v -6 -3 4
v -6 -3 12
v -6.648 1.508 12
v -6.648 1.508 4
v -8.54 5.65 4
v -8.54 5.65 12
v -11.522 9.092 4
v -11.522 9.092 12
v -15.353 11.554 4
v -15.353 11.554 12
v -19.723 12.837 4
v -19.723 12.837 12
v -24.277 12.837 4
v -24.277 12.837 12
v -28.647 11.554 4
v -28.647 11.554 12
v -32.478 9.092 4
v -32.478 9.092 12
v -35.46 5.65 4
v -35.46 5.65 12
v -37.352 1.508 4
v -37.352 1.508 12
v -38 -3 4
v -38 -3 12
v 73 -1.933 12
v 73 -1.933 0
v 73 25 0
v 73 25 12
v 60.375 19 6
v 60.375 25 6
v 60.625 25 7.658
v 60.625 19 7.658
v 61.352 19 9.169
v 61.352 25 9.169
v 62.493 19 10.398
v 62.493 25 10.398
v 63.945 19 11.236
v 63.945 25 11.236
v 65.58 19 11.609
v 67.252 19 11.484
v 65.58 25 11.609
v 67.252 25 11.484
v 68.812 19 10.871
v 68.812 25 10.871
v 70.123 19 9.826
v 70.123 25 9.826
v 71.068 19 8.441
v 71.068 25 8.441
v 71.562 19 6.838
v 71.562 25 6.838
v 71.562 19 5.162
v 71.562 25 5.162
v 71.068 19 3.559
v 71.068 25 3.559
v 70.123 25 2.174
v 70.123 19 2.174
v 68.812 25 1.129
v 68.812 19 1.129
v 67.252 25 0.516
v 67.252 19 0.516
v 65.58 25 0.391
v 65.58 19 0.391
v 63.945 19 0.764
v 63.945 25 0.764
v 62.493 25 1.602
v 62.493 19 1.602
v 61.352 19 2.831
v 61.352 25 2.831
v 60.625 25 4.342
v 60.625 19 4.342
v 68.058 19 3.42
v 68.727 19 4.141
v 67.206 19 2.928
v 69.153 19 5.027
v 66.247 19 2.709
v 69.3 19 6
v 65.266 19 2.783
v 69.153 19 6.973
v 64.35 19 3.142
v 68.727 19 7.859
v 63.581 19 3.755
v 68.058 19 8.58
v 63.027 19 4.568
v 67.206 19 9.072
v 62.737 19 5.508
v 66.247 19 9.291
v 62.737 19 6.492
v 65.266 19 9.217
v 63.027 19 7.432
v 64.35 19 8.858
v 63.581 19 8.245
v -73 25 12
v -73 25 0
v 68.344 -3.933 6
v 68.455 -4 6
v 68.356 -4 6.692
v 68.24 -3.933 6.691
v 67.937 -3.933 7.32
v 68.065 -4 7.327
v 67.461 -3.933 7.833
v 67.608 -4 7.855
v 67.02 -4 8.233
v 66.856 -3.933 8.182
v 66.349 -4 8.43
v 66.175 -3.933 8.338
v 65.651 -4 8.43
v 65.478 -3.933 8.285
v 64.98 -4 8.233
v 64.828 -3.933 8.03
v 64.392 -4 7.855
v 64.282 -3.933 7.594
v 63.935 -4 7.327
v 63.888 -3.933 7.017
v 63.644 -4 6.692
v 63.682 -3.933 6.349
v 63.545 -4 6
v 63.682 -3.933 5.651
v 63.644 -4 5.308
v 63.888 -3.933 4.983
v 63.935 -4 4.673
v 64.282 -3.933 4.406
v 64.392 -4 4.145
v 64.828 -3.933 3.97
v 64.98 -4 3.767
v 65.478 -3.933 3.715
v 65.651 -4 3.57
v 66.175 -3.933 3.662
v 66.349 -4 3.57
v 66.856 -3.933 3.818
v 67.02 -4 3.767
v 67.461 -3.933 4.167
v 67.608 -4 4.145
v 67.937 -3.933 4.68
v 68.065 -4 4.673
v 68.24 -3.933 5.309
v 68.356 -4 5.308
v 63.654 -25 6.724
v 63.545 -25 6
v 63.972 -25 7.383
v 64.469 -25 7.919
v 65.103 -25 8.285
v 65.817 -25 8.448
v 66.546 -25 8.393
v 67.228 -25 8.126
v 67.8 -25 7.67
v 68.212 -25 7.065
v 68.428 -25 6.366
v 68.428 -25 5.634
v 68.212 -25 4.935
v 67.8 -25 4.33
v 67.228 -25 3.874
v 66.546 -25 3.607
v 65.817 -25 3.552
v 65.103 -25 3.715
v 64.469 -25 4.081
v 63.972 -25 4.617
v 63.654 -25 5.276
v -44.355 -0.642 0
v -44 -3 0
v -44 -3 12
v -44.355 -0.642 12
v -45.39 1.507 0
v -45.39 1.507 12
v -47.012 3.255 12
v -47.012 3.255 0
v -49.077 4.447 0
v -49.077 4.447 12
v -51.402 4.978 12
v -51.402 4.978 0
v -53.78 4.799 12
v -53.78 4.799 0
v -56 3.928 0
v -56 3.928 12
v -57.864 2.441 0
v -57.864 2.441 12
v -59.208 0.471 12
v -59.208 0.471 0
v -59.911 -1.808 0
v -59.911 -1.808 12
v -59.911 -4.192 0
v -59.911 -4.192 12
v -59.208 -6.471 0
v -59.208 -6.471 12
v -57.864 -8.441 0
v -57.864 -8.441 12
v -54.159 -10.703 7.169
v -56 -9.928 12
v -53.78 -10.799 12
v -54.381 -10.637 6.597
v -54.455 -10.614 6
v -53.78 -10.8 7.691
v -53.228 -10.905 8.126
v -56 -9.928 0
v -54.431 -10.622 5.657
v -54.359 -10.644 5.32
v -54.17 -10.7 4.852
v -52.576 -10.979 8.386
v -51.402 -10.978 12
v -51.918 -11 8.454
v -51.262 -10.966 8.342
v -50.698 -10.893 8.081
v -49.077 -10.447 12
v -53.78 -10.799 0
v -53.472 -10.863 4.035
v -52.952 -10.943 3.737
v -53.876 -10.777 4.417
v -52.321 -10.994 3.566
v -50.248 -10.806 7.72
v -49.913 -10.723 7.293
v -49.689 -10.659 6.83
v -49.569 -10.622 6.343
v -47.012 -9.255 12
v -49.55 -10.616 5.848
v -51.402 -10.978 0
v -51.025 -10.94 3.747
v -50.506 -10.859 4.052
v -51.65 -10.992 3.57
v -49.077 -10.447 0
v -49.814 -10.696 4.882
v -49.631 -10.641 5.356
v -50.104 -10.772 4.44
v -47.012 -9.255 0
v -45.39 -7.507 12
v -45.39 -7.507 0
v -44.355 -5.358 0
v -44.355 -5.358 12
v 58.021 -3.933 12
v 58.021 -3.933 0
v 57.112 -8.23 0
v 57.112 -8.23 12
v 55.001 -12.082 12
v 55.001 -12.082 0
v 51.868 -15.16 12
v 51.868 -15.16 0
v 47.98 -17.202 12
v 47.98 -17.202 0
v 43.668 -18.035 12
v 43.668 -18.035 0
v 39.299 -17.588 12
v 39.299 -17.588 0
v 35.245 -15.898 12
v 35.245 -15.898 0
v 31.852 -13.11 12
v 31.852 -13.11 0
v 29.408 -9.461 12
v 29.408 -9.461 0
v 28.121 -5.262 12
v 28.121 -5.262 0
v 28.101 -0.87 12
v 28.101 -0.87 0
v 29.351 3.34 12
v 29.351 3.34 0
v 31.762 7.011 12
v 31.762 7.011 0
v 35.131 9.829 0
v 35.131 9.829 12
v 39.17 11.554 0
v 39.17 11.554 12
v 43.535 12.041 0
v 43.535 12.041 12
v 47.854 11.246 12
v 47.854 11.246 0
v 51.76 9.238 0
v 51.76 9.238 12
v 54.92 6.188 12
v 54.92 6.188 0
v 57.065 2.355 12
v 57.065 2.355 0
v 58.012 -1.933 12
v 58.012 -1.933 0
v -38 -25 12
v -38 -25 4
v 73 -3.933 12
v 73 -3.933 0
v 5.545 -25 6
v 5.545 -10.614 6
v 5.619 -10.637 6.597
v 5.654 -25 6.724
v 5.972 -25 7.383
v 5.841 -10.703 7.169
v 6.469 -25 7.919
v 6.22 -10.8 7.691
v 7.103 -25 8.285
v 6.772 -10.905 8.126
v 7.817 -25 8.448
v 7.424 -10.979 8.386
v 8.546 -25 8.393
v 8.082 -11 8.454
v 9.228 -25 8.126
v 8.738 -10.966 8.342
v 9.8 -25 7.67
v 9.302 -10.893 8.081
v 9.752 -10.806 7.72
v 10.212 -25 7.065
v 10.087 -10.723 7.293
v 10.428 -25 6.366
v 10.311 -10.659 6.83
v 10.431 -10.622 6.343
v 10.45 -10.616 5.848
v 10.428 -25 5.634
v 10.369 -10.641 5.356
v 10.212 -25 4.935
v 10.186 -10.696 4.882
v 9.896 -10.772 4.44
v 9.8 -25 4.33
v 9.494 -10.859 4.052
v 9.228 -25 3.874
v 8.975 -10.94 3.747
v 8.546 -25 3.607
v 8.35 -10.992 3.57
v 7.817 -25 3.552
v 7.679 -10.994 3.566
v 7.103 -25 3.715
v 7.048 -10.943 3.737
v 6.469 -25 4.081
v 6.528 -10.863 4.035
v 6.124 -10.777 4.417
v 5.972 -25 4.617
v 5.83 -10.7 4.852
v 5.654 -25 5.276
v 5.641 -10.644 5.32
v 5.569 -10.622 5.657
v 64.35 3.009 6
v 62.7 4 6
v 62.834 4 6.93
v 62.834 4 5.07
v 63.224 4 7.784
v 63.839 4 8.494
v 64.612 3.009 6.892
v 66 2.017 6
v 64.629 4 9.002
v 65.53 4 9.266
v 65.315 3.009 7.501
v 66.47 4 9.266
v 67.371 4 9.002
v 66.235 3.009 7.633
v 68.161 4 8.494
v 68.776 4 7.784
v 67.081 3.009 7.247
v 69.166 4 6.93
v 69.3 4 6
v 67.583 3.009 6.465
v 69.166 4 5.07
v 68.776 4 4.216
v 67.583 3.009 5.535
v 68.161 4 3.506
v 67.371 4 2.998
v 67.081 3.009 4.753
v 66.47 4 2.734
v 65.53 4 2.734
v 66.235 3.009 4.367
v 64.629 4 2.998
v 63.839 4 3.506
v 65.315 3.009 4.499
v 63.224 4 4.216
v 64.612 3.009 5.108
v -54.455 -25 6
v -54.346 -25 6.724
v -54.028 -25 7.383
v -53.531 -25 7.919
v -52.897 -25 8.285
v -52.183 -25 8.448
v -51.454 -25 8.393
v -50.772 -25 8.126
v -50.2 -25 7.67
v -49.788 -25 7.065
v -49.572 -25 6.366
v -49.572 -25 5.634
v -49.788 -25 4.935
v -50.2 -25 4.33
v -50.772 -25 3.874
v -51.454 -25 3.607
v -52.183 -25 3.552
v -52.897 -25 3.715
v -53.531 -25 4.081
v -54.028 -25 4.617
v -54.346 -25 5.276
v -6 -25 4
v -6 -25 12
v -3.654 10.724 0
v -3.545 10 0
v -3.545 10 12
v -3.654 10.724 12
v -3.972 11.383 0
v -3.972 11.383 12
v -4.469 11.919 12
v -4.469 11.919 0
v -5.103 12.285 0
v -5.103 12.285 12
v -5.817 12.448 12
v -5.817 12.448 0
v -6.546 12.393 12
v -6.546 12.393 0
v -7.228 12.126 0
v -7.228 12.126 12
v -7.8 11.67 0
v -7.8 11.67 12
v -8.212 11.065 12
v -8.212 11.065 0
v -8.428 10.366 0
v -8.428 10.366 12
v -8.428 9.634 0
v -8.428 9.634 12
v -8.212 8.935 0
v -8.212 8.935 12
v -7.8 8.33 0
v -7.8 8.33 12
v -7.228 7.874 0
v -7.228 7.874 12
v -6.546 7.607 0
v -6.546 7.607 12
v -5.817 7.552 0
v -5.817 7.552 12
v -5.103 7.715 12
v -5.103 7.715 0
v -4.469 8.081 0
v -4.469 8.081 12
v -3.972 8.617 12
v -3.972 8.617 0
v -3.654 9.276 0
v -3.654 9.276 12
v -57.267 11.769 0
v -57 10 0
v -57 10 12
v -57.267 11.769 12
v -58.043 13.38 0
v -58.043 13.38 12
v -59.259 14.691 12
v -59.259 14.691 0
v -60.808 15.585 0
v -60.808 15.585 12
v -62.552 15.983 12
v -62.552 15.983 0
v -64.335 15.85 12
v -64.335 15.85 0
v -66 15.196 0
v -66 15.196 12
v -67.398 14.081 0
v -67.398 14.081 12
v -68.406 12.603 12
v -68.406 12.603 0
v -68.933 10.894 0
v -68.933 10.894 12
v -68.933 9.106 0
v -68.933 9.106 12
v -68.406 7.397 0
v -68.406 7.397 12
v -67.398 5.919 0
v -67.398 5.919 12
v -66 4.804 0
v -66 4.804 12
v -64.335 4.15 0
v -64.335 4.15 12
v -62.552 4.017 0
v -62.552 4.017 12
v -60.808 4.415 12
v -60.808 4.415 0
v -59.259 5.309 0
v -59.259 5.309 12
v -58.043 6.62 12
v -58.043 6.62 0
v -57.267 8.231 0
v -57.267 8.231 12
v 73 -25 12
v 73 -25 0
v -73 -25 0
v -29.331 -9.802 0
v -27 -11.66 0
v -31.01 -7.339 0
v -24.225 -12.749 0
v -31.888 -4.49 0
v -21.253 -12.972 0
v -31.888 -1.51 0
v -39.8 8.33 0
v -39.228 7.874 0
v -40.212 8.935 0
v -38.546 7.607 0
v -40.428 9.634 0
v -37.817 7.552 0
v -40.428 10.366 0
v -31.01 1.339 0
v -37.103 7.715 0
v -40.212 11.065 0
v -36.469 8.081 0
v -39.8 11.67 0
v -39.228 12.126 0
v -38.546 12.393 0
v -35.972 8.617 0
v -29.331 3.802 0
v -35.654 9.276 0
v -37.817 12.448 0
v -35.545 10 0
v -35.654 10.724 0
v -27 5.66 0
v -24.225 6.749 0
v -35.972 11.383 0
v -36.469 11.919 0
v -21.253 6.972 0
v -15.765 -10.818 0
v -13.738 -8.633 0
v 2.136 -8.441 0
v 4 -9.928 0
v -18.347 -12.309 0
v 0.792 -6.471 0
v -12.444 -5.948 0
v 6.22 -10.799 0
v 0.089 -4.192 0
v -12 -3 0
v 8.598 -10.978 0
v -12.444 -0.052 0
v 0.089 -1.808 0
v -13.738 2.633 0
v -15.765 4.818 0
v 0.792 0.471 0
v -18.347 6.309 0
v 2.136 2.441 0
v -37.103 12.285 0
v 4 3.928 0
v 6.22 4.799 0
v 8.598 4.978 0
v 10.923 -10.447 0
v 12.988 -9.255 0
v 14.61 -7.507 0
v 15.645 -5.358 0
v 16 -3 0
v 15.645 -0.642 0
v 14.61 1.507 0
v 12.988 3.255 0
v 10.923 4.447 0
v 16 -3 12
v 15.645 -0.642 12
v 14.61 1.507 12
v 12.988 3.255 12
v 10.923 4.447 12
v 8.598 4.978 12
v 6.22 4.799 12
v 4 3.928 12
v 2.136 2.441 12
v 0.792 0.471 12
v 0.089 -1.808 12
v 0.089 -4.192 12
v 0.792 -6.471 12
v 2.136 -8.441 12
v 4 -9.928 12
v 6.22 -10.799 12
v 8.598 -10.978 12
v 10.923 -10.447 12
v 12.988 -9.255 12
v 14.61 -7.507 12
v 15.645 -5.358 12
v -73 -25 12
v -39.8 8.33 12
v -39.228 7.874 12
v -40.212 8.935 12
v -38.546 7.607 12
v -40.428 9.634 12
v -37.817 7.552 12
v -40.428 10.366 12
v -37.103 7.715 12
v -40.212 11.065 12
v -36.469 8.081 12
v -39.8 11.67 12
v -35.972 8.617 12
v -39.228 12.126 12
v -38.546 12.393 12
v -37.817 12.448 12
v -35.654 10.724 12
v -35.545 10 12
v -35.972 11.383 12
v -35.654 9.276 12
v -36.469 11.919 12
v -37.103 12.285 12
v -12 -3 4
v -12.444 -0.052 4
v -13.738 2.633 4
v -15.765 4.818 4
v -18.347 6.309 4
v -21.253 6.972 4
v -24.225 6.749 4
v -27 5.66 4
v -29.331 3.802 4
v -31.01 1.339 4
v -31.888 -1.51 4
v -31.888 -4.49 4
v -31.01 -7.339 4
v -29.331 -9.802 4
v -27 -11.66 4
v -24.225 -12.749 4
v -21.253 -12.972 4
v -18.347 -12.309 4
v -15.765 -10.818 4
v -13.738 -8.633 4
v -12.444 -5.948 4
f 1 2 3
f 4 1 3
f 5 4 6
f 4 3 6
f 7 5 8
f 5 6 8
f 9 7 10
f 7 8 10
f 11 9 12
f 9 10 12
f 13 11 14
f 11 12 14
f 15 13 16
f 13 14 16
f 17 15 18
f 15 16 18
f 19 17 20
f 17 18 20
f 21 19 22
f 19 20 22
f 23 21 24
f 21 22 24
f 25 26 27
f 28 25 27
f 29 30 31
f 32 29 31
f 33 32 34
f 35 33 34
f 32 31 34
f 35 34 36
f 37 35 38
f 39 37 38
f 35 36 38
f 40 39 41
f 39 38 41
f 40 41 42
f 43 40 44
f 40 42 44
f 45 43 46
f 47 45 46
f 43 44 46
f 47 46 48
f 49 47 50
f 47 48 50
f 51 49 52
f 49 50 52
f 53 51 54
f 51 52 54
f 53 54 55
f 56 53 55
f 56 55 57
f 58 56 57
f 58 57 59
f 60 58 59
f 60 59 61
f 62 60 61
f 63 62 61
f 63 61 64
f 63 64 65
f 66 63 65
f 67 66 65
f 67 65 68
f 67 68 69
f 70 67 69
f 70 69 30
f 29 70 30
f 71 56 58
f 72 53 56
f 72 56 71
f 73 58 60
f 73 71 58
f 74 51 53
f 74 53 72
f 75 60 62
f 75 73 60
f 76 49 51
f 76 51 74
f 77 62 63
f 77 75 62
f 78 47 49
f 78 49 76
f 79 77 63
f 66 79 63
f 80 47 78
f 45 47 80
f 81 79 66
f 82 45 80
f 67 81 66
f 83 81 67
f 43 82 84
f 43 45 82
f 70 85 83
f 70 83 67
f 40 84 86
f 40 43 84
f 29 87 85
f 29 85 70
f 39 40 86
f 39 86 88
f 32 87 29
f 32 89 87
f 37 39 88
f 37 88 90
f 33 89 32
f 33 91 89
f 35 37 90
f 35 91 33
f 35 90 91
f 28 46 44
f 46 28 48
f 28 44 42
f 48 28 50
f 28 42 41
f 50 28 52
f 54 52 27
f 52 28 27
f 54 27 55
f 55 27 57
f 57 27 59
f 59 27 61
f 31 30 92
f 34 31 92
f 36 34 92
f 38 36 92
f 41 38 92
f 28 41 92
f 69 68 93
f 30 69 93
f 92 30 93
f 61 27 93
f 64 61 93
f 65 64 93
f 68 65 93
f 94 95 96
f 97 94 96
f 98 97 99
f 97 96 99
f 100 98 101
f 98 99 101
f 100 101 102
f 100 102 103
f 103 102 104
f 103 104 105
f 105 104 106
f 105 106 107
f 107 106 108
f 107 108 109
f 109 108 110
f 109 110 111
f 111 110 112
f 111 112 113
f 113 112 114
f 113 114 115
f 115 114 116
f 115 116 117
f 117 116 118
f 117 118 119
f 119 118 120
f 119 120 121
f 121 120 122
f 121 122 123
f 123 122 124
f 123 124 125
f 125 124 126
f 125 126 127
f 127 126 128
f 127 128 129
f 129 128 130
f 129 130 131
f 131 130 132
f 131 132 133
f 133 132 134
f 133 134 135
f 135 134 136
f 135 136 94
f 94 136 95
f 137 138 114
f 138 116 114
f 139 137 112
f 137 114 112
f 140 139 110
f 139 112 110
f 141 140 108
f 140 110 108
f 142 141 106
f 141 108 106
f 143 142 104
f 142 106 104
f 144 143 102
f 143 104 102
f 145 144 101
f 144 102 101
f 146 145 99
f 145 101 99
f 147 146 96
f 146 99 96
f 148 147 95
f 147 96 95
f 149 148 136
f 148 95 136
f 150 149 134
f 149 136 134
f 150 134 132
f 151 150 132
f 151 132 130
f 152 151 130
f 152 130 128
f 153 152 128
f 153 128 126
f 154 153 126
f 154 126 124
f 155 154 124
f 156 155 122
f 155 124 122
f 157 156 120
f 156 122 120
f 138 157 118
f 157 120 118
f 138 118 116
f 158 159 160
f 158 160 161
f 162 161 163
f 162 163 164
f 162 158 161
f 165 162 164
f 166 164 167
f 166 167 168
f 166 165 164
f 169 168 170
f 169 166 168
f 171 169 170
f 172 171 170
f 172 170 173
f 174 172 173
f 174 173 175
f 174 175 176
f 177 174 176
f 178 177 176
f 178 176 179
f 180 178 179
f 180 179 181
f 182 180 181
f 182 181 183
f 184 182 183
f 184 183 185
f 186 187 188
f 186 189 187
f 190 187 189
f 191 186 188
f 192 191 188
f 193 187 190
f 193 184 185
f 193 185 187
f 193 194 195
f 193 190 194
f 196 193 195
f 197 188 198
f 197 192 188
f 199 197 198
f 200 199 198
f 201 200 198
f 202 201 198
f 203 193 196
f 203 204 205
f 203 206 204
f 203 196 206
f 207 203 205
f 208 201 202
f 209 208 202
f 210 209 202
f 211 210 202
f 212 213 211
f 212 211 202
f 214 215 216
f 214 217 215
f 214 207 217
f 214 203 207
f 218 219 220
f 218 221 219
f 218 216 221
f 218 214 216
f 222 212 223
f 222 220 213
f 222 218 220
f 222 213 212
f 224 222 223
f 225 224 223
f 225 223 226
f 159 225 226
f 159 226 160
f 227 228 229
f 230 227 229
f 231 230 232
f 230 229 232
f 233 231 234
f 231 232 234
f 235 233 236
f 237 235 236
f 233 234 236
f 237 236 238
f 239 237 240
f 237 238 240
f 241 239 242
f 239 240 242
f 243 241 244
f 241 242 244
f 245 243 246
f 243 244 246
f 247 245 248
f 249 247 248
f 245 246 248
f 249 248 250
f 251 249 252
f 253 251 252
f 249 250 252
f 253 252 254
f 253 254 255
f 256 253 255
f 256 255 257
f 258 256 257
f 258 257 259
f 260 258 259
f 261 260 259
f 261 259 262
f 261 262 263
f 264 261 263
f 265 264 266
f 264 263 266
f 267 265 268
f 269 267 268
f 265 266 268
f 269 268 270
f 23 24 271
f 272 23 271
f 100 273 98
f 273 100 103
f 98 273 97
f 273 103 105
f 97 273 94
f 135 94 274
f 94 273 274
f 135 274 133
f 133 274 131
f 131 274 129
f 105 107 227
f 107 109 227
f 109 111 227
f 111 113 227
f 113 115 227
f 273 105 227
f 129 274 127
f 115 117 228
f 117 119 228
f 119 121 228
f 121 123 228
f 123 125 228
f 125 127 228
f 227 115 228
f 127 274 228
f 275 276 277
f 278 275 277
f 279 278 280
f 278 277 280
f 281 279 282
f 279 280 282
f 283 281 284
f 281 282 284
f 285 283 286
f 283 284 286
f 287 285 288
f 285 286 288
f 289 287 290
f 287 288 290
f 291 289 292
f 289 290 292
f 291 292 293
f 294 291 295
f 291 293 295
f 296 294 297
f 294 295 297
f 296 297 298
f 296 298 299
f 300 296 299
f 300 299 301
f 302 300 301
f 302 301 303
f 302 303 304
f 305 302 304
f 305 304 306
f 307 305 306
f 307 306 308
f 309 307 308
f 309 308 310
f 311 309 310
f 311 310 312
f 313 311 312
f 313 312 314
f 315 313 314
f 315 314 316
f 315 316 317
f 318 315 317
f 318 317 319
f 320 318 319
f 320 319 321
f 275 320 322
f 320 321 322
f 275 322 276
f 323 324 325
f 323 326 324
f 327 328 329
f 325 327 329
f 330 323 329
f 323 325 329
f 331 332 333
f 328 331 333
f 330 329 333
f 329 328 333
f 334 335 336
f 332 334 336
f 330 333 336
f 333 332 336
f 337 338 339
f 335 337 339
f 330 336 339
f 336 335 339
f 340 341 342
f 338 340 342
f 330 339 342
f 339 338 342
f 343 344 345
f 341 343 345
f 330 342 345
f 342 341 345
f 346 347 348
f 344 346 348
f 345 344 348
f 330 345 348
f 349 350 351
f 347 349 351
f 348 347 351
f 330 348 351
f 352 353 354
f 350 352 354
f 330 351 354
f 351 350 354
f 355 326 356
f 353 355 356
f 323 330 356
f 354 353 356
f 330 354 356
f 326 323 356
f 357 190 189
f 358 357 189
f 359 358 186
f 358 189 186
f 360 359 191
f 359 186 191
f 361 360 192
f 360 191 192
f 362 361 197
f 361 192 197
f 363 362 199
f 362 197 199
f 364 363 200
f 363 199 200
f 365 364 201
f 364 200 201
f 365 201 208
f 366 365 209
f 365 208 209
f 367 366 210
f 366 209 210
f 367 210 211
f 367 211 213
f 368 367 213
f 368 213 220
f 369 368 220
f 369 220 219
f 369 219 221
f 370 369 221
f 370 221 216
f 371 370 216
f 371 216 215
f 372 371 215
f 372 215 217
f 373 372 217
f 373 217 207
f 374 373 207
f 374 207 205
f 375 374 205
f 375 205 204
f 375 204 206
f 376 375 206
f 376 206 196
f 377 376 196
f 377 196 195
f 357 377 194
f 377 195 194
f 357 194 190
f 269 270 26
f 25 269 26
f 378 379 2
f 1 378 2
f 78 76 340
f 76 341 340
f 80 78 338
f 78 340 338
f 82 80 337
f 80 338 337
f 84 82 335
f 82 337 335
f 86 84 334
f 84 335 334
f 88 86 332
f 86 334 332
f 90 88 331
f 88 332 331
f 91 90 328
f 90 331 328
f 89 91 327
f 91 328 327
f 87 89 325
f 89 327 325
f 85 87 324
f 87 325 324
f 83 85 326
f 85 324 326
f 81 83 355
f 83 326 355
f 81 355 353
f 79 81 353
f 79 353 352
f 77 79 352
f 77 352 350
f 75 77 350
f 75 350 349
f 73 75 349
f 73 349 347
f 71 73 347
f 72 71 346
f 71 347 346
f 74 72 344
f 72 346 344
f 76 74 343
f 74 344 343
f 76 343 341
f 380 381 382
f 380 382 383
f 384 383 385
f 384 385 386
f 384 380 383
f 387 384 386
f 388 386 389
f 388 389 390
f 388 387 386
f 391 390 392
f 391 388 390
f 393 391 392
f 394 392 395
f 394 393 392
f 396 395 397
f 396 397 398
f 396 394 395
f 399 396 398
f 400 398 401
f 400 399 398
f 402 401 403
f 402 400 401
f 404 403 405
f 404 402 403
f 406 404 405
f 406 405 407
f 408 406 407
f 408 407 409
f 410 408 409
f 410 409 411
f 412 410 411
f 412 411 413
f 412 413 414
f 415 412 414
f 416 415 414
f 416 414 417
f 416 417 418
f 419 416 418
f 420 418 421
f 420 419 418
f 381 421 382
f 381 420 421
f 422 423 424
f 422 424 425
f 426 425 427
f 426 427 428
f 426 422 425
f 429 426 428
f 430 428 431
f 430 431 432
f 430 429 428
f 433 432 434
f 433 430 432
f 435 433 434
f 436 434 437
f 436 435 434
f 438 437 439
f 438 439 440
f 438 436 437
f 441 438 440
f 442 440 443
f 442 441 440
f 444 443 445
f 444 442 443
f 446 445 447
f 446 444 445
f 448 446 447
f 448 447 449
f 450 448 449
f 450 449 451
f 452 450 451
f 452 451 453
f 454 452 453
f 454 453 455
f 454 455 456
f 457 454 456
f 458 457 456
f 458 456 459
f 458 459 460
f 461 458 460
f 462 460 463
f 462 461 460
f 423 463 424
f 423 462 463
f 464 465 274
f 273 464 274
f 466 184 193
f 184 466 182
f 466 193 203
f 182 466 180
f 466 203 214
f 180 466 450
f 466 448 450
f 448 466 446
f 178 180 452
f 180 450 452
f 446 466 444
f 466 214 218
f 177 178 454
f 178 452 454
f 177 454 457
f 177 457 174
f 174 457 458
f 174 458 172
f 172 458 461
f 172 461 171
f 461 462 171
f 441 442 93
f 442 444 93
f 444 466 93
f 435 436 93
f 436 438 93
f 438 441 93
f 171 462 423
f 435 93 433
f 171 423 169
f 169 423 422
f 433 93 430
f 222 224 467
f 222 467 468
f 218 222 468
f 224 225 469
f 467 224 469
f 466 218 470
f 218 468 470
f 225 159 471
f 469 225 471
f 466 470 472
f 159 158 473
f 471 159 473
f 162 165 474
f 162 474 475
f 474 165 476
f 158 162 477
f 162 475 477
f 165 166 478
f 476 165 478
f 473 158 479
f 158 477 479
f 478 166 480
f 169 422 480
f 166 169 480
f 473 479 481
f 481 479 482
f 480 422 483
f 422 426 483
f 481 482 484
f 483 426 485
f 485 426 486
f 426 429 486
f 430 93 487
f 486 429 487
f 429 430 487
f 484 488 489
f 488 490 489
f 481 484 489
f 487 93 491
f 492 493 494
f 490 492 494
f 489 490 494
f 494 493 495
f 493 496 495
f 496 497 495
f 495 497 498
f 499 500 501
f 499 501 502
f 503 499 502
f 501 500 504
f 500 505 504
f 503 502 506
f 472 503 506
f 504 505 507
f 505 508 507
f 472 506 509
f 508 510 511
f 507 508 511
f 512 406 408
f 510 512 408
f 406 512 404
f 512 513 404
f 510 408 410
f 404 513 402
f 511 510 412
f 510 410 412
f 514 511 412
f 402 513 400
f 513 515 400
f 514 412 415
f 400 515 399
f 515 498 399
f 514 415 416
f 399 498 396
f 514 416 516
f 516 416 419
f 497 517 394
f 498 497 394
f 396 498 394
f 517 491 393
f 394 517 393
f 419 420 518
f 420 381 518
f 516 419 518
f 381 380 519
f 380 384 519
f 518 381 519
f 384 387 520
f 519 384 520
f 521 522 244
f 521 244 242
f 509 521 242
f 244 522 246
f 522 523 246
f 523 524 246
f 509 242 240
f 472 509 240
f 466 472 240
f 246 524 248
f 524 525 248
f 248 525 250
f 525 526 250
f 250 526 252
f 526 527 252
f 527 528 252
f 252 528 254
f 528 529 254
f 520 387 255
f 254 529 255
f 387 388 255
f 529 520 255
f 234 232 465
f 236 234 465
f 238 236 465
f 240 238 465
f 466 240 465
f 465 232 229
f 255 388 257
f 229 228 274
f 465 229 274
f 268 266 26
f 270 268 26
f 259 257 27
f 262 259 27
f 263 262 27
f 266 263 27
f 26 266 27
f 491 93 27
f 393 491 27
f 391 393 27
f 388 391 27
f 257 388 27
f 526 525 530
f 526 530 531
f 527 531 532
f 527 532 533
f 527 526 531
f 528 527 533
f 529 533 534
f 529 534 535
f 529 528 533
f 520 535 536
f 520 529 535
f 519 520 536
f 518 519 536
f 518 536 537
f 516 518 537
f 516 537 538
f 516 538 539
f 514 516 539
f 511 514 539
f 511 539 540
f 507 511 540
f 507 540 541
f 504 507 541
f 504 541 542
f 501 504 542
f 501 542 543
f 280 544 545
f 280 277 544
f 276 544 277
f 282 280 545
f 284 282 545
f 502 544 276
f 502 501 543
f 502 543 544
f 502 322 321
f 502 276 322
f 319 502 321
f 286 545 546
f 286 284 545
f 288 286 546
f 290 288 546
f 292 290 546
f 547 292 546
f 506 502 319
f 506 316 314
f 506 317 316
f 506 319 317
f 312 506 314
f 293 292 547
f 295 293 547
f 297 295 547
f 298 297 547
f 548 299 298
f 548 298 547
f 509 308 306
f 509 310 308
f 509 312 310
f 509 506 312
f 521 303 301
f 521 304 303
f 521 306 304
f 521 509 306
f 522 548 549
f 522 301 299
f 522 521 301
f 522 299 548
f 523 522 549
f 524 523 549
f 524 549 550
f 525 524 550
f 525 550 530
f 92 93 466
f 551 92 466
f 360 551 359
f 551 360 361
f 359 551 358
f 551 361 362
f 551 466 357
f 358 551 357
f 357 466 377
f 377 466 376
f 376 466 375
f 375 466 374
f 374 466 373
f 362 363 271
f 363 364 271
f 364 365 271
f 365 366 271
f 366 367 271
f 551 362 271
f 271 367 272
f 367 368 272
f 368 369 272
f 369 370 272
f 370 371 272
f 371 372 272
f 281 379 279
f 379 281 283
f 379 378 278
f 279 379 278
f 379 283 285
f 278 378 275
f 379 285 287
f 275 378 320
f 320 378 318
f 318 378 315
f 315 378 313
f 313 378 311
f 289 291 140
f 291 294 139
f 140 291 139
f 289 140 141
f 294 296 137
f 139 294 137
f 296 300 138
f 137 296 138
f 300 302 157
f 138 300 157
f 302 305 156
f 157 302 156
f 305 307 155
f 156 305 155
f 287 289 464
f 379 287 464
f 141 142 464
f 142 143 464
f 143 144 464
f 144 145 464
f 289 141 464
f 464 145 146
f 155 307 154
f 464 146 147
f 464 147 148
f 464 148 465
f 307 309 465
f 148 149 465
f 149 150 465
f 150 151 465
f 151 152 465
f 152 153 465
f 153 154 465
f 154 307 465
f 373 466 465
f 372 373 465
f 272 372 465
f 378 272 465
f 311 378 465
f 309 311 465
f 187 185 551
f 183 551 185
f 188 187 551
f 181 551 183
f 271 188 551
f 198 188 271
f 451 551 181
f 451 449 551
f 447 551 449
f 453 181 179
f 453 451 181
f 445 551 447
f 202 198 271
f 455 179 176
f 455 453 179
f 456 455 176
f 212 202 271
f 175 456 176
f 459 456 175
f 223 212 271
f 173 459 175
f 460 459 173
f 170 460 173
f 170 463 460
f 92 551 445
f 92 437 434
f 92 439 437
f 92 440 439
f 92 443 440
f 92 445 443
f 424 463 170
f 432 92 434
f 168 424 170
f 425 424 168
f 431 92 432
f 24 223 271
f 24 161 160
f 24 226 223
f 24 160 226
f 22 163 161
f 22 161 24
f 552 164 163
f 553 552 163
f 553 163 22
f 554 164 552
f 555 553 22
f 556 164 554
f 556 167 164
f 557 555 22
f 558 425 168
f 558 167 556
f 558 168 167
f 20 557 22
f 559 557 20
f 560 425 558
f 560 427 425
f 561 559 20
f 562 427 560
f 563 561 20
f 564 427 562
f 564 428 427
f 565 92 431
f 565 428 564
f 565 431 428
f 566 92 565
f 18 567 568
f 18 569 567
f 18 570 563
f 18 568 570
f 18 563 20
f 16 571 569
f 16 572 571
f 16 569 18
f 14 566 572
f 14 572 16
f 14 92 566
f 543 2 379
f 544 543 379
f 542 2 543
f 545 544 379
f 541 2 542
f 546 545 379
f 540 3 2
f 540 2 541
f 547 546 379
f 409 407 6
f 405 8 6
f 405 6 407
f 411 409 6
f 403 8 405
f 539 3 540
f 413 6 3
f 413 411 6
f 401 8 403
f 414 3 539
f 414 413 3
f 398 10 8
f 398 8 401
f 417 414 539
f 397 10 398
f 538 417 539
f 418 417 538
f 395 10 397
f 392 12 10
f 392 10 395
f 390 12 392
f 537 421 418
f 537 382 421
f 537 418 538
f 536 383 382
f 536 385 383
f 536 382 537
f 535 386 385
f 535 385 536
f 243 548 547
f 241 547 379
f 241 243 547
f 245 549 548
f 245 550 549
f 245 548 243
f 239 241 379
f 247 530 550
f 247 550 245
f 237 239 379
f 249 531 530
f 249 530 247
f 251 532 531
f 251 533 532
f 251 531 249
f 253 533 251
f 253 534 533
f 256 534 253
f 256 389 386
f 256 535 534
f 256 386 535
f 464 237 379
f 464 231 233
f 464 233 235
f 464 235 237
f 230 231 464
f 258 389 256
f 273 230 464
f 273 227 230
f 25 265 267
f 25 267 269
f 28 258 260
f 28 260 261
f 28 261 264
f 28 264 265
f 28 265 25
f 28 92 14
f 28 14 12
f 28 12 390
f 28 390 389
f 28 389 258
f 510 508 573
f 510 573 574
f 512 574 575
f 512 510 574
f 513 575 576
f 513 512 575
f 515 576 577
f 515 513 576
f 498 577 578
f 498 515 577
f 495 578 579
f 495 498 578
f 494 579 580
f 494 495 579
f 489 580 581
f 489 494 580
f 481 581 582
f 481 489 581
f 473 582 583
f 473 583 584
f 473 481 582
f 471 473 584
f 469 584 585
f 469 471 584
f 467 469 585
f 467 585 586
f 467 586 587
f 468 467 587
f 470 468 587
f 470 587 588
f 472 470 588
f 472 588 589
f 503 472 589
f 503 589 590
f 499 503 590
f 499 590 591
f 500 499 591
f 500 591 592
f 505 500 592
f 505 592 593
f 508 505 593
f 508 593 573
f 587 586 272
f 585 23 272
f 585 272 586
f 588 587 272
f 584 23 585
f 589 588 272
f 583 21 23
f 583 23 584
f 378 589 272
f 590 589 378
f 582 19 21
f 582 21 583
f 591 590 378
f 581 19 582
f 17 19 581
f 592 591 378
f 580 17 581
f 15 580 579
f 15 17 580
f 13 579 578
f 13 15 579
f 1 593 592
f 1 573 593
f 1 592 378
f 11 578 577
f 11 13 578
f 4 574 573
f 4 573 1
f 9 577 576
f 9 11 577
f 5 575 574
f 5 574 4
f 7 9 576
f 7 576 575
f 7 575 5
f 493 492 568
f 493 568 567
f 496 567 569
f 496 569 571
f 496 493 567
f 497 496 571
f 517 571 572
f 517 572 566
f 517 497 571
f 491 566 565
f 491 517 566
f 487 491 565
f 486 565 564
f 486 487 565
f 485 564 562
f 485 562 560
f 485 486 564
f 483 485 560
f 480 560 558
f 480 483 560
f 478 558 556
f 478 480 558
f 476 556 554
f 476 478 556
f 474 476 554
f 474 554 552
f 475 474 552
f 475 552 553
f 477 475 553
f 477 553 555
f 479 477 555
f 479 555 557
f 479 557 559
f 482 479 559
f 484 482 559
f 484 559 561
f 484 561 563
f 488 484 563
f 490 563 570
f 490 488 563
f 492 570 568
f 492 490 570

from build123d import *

# Parameters (mm, degrees)
F0_R           = 8
F0_R_2         = 10
F0_R_3         = 6
F0_R_4         = 2.455
F1_DEPTH       = 12
F2_R           = 10
F3_DEPTH       = 8
F5_D           = 4.91
F5_DEPTH       = 20
F5_TIP         = 1.4751128197
F6_D           = 4.91
F6_DEPTH       = 21
F6_TIP         = 1.4751128197
F8_D           = 6.6
F8_DEPTH       = 21
F8_CBORE_D     = 11.25
F8_CBORE_DEPTH = 6
F8_TIP         = 1.9828400428


with BuildPart() as f1:
    # F0 (on Top) → F1 (new body)
    with BuildSketch(Plane.XY):
        with BuildLine():
            Line((-73, -25), (73, -25))
            Line((73, -25), (73, -3.9333401471))
            Line((73, -3.9333401471), (58.0210311287, -3.9333401471))
            ThreePointArc((58.0210311287, -3.9333401471), (27.9501482812, -3.0668074952), (58.0121529688, -1.9333401471))
            Line((58.0121529688, -1.9333401471), (73, -1.9333401471))
            Line((73, -1.9333401471), (73, 25))
            Line((73, 25), (-73, 25))
            Line((-73, 25), (-73, -25))
        make_face()
        with Locations((-52, -3)):
            Circle(F0_R, mode=Mode.SUBTRACT)
        with Locations((-22, -3)):
            Circle(F0_R_2, mode=Mode.SUBTRACT)
        with Locations((8, -3)):
            Circle(F0_R, mode=Mode.SUBTRACT)
        with Locations((-63, 10)):
            Circle(F0_R_3, mode=Mode.SUBTRACT)
        with Locations((-38, 10)):
            Circle(F0_R_4, mode=Mode.SUBTRACT)
        with Locations((-6, 10)):
            Circle(F0_R_4, mode=Mode.SUBTRACT)
    extrude(amount=F1_DEPTH)

    # F2 (on face) → F3 (cut)
    with BuildSketch(Plane.XY.offset(12)):
        with BuildLine():
            Line((-6, -25), (-6, -3))
            ThreePointArc((-6, -3), (-22, 13), (-38, -3))
            Line((-38, -3), (-38, -25))
            Line((-38, -25), (-6, -25))
        make_face()
        with Locations((-22, -3)):
            Circle(F2_R, mode=Mode.SUBTRACT)
    extrude(amount=-F3_DEPTH, mode=Mode.SUBTRACT)

    # F5
    with Locations(Plane.XZ.offset(25)):
        with Locations((-52, 6), (8, 6)):
            Hole(F5_D / 2, depth=F5_DEPTH)
            with Locations((0, 0, -(F5_DEPTH + F5_TIP / 2))):  # 118° drill point
                Cone(0, F5_D / 2, F5_TIP, mode=Mode.SUBTRACT)

    # F6
    with Locations(Plane.XZ.offset(25)):
        with Locations((66, 6)):
            Hole(F6_D / 2, depth=F6_DEPTH)
            with Locations((0, 0, -(F6_DEPTH + F6_TIP / 2))):  # 118° drill point
                Cone(0, F6_D / 2, F6_TIP, mode=Mode.SUBTRACT)

    # F8
    with Locations(Plane(origin=(0, 25, 0), x_dir=(-1, 0, 0), z_dir=(0, 1, 0))):
        with Locations((-66, 6)):
            CounterBoreHole(F8_D / 2, F8_CBORE_D / 2, F8_CBORE_DEPTH, depth=F8_DEPTH)
            with Locations((0, 0, -(F8_DEPTH + F8_TIP / 2))):  # 118° drill point
                Cone(0, F8_D / 2, F8_TIP, mode=Mode.SUBTRACT)


solid = f1.part
